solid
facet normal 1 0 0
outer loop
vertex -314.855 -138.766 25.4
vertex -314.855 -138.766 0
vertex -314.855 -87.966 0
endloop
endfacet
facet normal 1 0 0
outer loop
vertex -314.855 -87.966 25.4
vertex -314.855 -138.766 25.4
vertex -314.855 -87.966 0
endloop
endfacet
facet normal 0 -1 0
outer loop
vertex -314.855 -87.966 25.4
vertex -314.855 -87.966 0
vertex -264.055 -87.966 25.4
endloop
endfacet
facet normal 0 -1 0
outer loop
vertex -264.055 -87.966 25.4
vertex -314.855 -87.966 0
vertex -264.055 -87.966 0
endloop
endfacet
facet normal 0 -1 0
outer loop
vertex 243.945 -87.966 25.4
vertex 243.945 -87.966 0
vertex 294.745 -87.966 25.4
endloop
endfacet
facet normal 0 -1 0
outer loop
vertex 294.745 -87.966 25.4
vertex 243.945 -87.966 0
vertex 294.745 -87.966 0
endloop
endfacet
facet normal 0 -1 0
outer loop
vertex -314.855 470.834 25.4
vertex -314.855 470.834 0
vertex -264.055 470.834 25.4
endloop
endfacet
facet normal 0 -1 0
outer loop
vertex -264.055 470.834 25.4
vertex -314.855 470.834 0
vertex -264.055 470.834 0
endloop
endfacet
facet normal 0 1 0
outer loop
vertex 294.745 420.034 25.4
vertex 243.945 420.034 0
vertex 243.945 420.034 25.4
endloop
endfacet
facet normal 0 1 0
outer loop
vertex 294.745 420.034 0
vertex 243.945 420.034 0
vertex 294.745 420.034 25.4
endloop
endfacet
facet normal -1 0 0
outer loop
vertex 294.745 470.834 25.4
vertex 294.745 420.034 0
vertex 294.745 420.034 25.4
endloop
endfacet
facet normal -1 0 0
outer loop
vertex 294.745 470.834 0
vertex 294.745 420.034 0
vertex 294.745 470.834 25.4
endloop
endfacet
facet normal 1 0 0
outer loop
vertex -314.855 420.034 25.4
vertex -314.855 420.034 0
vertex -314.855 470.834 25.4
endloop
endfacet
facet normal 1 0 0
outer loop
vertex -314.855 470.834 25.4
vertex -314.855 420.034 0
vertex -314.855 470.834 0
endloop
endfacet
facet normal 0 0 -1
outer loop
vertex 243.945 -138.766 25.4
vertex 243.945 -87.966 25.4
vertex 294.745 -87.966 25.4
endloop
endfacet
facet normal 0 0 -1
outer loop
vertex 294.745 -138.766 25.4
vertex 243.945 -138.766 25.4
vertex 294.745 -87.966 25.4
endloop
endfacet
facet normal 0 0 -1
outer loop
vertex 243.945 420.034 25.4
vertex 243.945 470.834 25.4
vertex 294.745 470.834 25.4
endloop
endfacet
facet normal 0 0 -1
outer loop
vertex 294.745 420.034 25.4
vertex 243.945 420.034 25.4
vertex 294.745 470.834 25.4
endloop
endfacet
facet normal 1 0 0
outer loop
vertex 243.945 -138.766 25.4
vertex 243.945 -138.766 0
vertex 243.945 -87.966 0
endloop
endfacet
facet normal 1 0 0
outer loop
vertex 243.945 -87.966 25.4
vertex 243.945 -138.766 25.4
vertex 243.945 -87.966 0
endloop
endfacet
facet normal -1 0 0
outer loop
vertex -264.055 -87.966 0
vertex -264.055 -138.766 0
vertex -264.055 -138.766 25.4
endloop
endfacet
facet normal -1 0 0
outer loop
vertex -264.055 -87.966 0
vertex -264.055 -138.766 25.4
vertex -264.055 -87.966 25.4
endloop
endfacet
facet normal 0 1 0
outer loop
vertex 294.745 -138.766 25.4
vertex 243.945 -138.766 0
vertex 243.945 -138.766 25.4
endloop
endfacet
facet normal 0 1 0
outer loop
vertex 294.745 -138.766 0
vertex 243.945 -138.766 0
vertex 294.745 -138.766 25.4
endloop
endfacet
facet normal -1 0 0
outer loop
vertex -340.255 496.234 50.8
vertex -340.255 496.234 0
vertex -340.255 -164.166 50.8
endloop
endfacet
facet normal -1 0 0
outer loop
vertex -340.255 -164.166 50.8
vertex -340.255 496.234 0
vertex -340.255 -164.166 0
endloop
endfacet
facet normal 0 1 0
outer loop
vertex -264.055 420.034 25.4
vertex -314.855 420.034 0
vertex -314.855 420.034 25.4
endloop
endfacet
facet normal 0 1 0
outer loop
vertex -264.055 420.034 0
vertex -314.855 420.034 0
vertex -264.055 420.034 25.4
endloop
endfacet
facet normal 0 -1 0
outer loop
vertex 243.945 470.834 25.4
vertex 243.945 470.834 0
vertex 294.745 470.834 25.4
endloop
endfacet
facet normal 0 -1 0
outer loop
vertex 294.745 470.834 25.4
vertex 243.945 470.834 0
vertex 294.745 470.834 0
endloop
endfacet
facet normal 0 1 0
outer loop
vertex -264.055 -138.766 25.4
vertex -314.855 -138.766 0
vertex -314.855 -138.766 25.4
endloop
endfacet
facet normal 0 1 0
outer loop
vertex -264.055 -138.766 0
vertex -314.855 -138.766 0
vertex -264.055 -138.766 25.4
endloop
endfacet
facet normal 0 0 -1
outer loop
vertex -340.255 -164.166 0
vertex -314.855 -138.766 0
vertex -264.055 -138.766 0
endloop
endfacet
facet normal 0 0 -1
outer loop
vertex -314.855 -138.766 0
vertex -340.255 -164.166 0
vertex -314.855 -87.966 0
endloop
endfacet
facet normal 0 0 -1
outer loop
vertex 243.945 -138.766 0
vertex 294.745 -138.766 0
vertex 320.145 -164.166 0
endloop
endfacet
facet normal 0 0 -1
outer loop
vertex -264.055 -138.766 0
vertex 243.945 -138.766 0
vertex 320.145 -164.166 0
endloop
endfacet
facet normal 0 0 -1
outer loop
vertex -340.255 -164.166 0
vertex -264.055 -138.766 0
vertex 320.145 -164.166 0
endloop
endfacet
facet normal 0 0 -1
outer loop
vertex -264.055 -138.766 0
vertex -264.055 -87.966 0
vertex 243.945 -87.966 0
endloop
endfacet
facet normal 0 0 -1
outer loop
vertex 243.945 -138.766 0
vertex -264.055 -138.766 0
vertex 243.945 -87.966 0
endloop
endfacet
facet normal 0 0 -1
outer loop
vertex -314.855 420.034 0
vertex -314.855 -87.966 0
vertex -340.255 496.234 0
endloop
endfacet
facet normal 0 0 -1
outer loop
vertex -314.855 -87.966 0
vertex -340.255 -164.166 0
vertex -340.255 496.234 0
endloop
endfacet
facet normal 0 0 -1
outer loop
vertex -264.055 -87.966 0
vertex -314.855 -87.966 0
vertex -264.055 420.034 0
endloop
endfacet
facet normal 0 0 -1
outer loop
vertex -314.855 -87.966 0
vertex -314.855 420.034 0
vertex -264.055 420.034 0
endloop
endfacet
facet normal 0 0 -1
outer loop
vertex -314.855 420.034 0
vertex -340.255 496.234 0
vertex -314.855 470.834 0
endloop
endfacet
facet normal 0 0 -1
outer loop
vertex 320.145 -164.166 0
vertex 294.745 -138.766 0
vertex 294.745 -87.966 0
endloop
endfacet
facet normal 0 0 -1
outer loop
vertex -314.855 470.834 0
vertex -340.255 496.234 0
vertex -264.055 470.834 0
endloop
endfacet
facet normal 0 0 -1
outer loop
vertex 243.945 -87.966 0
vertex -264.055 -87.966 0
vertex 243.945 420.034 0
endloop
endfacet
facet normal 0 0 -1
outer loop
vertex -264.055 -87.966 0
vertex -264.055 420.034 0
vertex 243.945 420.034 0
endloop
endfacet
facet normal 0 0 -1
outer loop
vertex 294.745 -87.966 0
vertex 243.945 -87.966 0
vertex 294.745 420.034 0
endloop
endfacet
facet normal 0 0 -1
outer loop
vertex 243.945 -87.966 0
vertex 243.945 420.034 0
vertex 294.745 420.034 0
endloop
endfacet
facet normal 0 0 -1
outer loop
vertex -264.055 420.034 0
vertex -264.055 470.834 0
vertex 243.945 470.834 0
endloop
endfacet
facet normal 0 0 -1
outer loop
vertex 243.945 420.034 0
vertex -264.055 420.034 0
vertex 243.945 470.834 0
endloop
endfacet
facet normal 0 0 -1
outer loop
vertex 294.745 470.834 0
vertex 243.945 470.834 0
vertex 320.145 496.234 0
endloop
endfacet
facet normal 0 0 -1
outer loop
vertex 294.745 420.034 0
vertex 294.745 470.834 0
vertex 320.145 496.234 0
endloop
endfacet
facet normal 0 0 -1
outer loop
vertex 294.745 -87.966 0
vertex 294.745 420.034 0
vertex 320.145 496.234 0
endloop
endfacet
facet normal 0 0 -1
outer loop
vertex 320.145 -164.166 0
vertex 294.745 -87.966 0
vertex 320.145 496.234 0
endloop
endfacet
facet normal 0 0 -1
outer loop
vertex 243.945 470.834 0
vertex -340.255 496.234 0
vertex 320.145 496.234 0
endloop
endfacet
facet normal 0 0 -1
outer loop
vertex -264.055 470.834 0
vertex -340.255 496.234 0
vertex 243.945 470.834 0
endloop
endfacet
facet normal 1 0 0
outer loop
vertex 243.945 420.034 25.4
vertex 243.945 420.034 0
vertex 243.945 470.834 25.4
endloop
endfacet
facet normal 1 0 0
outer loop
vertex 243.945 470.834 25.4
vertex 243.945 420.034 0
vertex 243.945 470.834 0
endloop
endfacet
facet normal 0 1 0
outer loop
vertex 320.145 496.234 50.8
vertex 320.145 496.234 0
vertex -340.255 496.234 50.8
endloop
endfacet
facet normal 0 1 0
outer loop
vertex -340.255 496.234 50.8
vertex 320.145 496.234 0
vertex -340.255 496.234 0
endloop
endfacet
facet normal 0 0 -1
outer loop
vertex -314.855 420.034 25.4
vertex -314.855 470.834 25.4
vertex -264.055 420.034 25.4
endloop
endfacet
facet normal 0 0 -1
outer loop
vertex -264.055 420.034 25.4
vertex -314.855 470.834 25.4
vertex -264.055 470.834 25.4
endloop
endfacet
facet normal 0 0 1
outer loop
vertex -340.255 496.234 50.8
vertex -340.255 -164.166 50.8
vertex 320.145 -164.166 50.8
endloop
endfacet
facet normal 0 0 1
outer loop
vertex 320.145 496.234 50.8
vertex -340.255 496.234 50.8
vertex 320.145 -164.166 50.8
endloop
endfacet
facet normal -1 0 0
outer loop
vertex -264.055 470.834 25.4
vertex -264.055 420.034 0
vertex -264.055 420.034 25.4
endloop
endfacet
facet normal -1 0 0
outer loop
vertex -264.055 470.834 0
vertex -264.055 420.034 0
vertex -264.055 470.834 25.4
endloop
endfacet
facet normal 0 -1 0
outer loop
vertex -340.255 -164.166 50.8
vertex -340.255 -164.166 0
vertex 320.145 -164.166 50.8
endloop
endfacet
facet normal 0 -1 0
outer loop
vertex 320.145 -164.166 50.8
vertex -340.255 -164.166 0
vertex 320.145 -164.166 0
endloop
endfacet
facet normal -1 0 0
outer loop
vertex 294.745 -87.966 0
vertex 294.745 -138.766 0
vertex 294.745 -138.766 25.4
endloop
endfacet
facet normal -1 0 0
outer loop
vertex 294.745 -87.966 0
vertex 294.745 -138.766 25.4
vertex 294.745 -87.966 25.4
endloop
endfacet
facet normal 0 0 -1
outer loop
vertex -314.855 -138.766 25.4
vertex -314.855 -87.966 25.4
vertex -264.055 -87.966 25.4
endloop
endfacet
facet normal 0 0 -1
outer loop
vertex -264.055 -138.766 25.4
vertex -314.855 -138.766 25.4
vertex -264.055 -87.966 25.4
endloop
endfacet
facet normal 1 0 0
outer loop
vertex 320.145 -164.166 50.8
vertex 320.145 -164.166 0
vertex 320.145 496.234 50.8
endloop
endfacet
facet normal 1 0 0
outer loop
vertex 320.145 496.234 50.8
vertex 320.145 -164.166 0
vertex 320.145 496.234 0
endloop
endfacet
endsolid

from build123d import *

# Parameters (mm, degrees)
F0_W     = 25.4
F0_H     = 50.8
F0_W_2   = 50.8
F0_H_2   = 25.4
F0_W_3   = 508
F0_H_3   = 508
F1_DEPTH = 50.8
F2_DEPTH = 25.4
F3_DEPTH = 25.4
F4_DEPTH = 25.4
F5_DEPTH = 25.4


with BuildPart() as f1:
    # F0 (on Top) → F1 (new body)
    with BuildSketch(Plane.XY):
        with Locations((307.4446349591, -113.3660624364)):
            Rectangle(F0_W, F0_H)
        with Locations((-289.4553650409, -151.4660624364)):
            Rectangle(F0_W_2, F0_H_2)
        with Locations((307.4446349591, 483.5339375636)):
            Rectangle(F0_W, F0_H_2)
        with Locations((-289.4553650409, -113.3660624364)):
            Rectangle(F0_W_2, F0_H)
        with Locations((307.4446349591, -151.4660624364)):
            Rectangle(F0_W, F0_H_2)
        with Locations((-327.5553650409, -151.4660624364)):
            Rectangle(F0_W, F0_H_2)
        with Locations((269.3446349591, -113.3660624364)):
            Rectangle(F0_W_2, F0_H)
        with Locations((-10.0553650409, -151.4660624364)):
            Rectangle(F0_W_3, F0_H_2)
        with Locations((269.3446349591, -151.4660624364)):
            Rectangle(F0_W_2, F0_H_2)
        with Locations((-10.0553650409, 483.5339375636)):
            Rectangle(F0_W_3, F0_H_2)
        with Locations((269.3446349591, 483.5339375636)):
            Rectangle(F0_W_2, F0_H_2)
        with Locations((-327.5553650409, -113.3660624364)):
            Rectangle(F0_W, F0_H)
        with Locations((-327.5553650409, 166.0339375636)):
            Rectangle(F0_W, F0_H_3)
        with Locations((269.3446349591, 166.0339375636)):
            Rectangle(F0_W_2, F0_H_3)
        with Locations((307.4446349591, 166.0339375636)):
            Rectangle(F0_W, F0_H_3)
        with Locations((307.4446349591, 445.4339375636)):
            Rectangle(F0_W, F0_H)
        with Locations((269.3446349591, 445.4339375636)):
            Rectangle(F0_W_2, F0_H)
        with Locations((-10.0553650409, 166.0339375636)):
            Rectangle(F0_W_3, F0_H_3)
        with Locations((-10.0553650409, -113.3660624364)):
            Rectangle(F0_W_3, F0_H)
        with Locations((-289.4553650409, 166.0339375636)):
            Rectangle(F0_W_2, F0_H_3)
        with Locations((-10.0553650409, 445.4339375636)):
            Rectangle(F0_W_3, F0_H)
        with Locations((-289.4553650409, 445.4339375636)):
            Rectangle(F0_W_2, F0_H)
        with Locations((-327.5553650409, 445.4339375636)):
            Rectangle(F0_W, F0_H)
        with Locations((-327.5553650409, 483.5339375636)):
            Rectangle(F0_W, F0_H_2)
        with Locations((-289.4553650409, 483.5339375636)):
            Rectangle(F0_W_2, F0_H_2)
    extrude(amount=F1_DEPTH)

    # F0 (on Top) → F2 (cut)
    with BuildSketch(Plane.XY):
        with Locations((269.3446349591, -113.3660624364)):
            Rectangle(F0_W_2, F0_H)
    extrude(amount=F2_DEPTH, mode=Mode.SUBTRACT)

    # F0 (on Top) → F3 (cut)
    with BuildSketch(Plane.XY):
        with Locations((269.3446349591, 445.4339375636)):
            Rectangle(F0_W_2, F0_H)
    extrude(amount=F3_DEPTH, mode=Mode.SUBTRACT)

    # F0 (on Top) → F4 (cut)
    with BuildSketch(Plane.XY):
        with Locations((-289.4553650409, 445.4339375636)):
            Rectangle(F0_W_2, F0_H)
    extrude(amount=F4_DEPTH, mode=Mode.SUBTRACT)

    # F0 (on Top) → F5 (cut)
    with BuildSketch(Plane.XY):
        with Locations((-289.4553650409, -113.3660624364)):
            Rectangle(F0_W_2, F0_H)
    extrude(amount=F5_DEPTH, mode=Mode.SUBTRACT)


solid = f1.part
